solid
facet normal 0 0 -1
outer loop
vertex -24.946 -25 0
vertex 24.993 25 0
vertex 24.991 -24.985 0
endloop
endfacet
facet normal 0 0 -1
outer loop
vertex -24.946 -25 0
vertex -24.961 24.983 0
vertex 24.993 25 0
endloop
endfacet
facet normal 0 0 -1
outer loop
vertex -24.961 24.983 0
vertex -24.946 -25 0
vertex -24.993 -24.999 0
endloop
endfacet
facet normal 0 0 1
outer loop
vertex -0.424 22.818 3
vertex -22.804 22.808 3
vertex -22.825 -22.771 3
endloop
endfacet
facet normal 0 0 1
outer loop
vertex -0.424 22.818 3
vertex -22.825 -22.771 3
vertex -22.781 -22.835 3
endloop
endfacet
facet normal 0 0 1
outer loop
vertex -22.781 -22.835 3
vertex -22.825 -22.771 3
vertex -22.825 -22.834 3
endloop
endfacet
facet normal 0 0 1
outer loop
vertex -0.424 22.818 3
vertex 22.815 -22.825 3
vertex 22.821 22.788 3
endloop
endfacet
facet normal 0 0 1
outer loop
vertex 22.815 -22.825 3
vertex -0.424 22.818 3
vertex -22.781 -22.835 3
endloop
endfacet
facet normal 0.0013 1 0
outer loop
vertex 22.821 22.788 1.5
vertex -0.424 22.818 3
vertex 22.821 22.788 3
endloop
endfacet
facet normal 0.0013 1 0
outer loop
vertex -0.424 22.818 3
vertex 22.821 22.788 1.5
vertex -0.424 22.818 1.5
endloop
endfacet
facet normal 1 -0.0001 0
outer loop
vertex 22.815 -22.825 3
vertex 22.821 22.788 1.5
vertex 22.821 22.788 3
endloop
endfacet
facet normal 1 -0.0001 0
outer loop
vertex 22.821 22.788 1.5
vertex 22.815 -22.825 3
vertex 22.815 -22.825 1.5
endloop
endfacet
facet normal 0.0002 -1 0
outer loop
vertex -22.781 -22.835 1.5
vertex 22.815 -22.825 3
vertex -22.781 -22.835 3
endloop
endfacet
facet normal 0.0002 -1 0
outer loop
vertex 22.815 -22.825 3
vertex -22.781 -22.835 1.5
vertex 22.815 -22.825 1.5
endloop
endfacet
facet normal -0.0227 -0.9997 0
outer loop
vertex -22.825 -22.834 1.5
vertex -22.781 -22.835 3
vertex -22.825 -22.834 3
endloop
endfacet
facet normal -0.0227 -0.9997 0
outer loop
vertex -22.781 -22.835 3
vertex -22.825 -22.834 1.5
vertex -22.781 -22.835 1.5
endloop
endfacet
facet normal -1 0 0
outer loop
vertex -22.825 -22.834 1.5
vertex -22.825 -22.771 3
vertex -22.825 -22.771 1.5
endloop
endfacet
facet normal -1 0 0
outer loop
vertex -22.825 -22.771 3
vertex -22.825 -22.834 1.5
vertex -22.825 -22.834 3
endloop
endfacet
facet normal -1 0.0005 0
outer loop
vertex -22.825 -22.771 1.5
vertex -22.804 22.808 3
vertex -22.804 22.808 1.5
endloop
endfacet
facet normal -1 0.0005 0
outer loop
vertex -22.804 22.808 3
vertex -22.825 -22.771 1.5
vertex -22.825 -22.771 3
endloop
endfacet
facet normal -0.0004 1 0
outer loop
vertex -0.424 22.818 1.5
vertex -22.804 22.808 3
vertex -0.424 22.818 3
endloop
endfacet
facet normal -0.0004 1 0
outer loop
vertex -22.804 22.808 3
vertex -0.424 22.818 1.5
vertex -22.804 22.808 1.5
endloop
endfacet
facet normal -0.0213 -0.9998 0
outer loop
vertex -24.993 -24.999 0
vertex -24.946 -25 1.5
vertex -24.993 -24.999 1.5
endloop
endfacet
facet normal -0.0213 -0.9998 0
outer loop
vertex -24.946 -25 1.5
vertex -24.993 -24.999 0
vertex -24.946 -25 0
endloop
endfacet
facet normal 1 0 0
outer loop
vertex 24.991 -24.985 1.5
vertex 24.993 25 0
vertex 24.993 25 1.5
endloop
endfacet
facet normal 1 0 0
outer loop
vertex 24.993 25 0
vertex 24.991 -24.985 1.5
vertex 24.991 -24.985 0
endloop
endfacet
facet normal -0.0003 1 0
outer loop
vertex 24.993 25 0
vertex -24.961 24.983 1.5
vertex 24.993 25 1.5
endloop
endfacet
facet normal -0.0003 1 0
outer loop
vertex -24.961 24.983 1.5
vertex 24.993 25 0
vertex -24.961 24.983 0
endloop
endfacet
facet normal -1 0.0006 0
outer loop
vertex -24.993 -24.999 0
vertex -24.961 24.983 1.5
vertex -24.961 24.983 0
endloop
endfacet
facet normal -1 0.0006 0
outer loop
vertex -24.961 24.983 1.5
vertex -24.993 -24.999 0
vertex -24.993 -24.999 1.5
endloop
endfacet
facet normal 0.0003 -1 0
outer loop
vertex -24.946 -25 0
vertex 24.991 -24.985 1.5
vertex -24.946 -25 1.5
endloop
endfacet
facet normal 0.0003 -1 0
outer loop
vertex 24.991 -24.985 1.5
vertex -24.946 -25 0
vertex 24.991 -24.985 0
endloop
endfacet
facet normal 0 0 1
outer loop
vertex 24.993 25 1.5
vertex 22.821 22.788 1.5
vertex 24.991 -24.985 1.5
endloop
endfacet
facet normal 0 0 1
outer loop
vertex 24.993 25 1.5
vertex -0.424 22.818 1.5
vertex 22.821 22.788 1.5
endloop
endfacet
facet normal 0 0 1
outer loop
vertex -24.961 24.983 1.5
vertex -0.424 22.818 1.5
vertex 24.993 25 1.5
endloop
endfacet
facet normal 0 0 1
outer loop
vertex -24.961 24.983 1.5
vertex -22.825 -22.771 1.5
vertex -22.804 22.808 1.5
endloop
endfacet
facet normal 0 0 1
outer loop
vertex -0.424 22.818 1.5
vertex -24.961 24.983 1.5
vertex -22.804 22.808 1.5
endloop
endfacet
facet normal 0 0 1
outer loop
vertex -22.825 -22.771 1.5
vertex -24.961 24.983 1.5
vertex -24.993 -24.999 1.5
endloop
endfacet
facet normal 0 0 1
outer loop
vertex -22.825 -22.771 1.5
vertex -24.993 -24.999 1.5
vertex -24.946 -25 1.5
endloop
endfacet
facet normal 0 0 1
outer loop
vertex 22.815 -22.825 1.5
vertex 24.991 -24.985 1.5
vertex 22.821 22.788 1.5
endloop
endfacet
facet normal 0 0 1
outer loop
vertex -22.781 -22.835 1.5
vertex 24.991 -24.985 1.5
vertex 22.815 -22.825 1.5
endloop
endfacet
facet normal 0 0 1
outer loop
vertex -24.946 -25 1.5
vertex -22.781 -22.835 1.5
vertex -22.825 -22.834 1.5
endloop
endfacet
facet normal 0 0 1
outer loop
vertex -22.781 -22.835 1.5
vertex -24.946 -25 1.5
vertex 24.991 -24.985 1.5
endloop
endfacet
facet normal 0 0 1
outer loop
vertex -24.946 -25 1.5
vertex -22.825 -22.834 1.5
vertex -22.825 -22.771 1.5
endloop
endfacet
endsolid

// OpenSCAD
// Module names are of the form poly_<inkscape-path-id>().  As a result,
// you can associate a polygon in this OpenSCAD program with the corresponding
// SVG element in the Inkscape document by looking for the XML element with
// the attribute id="inkscape-path-id".

// fudge value is used to ensure that subtracted solids are a tad taller
// in the z dimension than the polygon being subtracted from.  This helps
// keep the resulting .stl file manifold.
fudge = 0.1;

module poly_fg_arrow_3_mm(h)
{
  scale([25.4/90, -25.4/90, 1]) union()
  {
    linear_extrude(height=h)
      polygon([[-61.400830,-39.496270],[39.520430,61.424980],[51.453250,49.492150],[12.571750,10.610650],[12.571760,-28.205090],[21.008920,-28.205090],[4.133980,-57.399100],[-12.741520,-28.204490],[-4.303780,-28.204920],[-4.303770,-6.264720],[-49.468000,-51.428950],[-61.400830,-39.496120]]);
  }
}

module poly_fg_border_3_mm(h)
{
  scale([25.4/90, -25.4/90, 1]) union()
  {
    difference()
    {
       linear_extrude(height=h)
         polygon([[-1.503450,-80.851230],[-80.801290,-80.817030],[-80.876490,80.685880],[-80.875490,80.906590],[-80.721190,80.912590],[80.842270,80.874490],[80.861770,-80.743660],[-1.503450,-80.851080]]);
       translate([0, 0, -fudge])
         linear_extrude(height=h+2*fudge)
           polygon([[71.649870,-71.638350],[71.587370,71.674150],[-71.683130,71.674150],[-71.660630,-71.602210],[71.649910,-71.638310]]);
    }
  }
}

module poly_bg_1_5_mm(h)
{
  scale([25.4/90, -25.4/90, 1]) union()
  {
    linear_extrude(height=h)
      polygon([[-88.392100,88.582680],[88.550680,88.528580],[88.557680,-88.582680],[-88.442900,-88.520780],[-88.557680,88.577890]]);
  }
}

module inkscape(h)
{

poly_fg_arrow_3_mm(3);
poly_fg_border_3_mm(3);
poly_bg_1_5_mm(1.5);
}

inkscape(5);
